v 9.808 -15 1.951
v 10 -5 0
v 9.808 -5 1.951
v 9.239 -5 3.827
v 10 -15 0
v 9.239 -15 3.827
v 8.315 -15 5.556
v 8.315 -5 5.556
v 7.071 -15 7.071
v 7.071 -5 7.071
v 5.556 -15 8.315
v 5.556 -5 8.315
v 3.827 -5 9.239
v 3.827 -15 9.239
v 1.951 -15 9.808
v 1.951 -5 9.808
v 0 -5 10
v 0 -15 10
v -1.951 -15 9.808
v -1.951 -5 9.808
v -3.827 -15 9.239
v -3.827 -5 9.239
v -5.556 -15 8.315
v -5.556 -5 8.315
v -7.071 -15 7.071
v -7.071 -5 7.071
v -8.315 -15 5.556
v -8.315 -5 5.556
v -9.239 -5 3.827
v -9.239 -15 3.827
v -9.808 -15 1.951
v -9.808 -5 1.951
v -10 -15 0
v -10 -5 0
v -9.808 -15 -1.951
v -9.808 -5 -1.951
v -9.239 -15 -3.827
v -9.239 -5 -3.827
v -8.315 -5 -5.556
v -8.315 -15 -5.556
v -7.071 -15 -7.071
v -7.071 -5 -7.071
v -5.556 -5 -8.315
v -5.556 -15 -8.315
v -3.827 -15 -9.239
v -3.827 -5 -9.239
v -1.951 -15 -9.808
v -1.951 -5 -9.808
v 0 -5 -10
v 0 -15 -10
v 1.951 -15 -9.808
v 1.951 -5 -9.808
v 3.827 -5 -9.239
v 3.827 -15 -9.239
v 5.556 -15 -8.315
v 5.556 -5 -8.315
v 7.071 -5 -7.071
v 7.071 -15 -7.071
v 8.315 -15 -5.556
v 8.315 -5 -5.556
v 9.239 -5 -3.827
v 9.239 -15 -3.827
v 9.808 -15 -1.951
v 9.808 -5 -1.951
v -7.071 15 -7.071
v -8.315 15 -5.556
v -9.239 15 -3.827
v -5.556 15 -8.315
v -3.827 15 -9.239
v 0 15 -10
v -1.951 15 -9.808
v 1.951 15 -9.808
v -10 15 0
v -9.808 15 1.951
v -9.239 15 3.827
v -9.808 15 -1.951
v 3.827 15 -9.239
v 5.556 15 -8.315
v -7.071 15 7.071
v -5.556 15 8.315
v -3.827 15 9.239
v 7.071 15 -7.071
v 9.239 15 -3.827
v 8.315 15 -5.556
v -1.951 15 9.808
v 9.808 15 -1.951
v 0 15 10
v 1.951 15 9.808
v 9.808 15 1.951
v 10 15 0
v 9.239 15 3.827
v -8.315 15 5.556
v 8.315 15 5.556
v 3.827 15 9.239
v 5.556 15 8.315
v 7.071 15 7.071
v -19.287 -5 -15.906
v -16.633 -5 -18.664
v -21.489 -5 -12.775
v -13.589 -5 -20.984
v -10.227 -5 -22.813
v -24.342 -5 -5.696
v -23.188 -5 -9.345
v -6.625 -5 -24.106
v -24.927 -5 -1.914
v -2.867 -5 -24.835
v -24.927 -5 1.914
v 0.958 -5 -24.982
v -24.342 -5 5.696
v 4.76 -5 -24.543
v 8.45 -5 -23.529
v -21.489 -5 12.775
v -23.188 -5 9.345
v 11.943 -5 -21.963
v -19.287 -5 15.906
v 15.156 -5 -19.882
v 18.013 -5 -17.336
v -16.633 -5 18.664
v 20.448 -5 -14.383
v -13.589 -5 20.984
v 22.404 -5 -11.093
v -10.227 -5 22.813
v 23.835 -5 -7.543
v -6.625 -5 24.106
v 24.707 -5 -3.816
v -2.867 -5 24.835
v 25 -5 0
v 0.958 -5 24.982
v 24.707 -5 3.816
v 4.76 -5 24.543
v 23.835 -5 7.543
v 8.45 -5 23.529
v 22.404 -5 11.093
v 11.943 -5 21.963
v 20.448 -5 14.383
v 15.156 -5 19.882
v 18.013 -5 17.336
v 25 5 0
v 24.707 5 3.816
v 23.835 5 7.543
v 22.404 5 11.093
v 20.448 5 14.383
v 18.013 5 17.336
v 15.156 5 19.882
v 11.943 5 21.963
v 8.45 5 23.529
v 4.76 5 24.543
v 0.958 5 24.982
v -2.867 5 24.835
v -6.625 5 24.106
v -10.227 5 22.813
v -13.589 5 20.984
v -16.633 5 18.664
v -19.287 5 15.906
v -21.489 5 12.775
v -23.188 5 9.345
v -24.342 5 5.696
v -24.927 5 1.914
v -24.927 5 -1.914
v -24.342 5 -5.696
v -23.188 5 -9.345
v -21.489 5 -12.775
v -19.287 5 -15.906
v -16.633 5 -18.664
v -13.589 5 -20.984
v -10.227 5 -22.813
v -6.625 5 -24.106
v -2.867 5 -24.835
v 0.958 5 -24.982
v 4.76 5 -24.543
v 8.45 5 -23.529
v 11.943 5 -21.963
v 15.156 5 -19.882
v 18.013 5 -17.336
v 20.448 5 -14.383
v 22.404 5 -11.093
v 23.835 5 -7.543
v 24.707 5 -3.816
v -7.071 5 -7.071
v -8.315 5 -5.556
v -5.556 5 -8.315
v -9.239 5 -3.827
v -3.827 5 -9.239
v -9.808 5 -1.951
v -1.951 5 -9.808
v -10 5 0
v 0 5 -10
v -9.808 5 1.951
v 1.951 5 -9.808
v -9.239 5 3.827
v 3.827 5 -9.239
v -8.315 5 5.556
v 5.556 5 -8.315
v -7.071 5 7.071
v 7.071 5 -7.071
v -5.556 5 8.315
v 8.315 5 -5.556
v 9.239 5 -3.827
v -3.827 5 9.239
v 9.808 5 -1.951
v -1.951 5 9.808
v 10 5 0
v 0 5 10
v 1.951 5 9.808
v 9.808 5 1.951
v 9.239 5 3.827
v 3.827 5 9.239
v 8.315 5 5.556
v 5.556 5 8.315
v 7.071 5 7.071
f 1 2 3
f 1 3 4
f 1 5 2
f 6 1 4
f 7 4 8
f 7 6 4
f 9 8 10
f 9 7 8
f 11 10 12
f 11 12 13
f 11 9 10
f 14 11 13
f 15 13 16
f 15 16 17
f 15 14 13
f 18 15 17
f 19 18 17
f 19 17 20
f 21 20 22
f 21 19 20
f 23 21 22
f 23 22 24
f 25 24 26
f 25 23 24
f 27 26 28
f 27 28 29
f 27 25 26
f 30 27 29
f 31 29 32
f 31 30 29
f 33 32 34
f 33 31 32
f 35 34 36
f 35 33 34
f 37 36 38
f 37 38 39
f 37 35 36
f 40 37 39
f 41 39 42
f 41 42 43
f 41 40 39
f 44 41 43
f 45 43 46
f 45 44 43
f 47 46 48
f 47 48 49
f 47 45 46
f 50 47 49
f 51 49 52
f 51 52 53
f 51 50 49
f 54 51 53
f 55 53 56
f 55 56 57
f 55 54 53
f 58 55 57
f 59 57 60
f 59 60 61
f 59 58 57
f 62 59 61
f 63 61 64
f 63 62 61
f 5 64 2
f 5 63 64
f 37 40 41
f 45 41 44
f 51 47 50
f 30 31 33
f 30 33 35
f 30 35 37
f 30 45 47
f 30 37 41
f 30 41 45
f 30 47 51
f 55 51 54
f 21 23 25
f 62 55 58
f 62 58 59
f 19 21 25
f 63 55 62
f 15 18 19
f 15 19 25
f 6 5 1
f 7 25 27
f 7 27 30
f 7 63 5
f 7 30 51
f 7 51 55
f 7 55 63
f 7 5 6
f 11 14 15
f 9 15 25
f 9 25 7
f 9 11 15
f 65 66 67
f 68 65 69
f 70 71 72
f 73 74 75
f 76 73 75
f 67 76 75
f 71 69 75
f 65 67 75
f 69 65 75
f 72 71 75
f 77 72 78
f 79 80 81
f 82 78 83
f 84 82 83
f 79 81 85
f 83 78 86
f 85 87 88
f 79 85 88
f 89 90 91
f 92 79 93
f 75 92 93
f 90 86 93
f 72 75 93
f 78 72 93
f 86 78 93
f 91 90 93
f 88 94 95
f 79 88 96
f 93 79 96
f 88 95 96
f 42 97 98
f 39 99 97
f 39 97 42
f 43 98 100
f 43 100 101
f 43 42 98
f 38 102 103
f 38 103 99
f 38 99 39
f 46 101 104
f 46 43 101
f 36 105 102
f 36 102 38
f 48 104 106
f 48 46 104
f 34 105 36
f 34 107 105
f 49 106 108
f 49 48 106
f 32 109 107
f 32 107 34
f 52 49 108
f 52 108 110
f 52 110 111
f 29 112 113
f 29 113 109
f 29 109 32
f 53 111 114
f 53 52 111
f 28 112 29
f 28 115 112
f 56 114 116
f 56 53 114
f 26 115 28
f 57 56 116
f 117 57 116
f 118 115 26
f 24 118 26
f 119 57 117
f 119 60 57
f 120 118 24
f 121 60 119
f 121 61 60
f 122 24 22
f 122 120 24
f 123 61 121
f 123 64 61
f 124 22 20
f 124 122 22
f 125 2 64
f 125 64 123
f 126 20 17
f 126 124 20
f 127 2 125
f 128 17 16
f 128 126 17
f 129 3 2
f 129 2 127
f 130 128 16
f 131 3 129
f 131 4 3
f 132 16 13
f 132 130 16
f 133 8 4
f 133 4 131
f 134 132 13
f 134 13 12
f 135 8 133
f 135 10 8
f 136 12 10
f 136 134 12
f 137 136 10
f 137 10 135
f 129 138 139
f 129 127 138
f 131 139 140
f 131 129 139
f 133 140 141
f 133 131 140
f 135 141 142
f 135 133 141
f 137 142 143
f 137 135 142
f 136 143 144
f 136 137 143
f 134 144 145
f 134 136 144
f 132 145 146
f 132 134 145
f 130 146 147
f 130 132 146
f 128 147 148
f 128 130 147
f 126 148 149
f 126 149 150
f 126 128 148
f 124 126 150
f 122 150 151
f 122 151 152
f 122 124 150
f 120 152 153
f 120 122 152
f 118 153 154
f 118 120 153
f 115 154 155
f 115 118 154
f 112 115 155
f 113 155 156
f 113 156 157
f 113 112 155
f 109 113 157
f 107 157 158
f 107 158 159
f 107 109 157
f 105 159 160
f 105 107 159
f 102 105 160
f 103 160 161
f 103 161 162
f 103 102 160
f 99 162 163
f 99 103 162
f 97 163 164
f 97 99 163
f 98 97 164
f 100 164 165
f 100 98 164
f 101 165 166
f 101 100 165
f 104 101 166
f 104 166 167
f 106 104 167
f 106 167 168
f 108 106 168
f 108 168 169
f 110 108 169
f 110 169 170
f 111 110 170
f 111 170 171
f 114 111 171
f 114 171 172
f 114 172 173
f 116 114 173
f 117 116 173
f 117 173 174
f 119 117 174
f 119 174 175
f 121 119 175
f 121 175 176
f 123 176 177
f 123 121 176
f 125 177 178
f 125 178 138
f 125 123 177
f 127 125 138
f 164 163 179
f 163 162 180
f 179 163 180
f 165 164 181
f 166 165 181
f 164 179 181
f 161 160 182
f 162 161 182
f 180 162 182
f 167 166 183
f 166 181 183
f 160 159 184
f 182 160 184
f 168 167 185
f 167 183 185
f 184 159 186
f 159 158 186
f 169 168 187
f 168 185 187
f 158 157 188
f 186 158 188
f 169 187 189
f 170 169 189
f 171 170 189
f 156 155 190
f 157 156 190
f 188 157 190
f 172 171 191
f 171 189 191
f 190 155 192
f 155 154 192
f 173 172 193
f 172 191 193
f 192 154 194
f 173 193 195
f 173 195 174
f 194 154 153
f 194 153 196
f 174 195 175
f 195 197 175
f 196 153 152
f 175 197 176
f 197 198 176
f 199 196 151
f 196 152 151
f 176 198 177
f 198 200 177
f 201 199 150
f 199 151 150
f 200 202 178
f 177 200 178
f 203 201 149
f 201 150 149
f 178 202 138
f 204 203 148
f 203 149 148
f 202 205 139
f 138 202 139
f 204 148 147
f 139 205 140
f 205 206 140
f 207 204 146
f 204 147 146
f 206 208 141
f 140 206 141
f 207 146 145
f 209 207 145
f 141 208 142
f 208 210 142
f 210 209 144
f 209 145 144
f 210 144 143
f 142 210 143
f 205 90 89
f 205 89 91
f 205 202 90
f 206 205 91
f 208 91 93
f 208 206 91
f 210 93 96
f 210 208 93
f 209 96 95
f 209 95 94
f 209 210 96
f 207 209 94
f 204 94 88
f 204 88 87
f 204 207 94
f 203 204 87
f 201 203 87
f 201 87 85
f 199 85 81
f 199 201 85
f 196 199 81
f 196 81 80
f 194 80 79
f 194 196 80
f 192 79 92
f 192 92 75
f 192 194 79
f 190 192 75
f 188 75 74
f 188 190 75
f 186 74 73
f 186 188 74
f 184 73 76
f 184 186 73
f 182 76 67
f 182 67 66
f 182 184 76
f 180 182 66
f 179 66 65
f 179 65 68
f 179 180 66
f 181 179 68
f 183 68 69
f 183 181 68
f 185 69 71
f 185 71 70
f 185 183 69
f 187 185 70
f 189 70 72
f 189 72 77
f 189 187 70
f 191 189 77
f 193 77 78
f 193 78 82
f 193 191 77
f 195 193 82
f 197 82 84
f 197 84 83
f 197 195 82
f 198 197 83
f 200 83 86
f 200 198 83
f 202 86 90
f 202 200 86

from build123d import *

# Parameters (mm, degrees)
F0_R     = 10
F1_DEPTH = 15
F2_DEPTH = 15
F0_R_2   = 25
F3_DEPTH = 5
F4_DEPTH = 5


with BuildPart() as f1:
    # F0 (on Front) → F1 (new body)
    with BuildSketch(Plane.XZ):
        Circle(F0_R)
    extrude(amount=F1_DEPTH)

    # F0 (on Front) → F2 (join)
    with BuildSketch(Plane.XZ):
        Circle(F0_R)
    extrude(amount=-F2_DEPTH)

    # F0 (on Front) → F3 (join)
    with BuildSketch(Plane.XZ):
        Circle(F0_R_2)
        Circle(F0_R, mode=Mode.SUBTRACT)
    extrude(amount=F3_DEPTH)

    # F0 (on Front) → F4 (join)
    with BuildSketch(Plane.XZ):
        Circle(F0_R_2)
        Circle(F0_R, mode=Mode.SUBTRACT)
    extrude(amount=-F4_DEPTH)


solid = f1.part
